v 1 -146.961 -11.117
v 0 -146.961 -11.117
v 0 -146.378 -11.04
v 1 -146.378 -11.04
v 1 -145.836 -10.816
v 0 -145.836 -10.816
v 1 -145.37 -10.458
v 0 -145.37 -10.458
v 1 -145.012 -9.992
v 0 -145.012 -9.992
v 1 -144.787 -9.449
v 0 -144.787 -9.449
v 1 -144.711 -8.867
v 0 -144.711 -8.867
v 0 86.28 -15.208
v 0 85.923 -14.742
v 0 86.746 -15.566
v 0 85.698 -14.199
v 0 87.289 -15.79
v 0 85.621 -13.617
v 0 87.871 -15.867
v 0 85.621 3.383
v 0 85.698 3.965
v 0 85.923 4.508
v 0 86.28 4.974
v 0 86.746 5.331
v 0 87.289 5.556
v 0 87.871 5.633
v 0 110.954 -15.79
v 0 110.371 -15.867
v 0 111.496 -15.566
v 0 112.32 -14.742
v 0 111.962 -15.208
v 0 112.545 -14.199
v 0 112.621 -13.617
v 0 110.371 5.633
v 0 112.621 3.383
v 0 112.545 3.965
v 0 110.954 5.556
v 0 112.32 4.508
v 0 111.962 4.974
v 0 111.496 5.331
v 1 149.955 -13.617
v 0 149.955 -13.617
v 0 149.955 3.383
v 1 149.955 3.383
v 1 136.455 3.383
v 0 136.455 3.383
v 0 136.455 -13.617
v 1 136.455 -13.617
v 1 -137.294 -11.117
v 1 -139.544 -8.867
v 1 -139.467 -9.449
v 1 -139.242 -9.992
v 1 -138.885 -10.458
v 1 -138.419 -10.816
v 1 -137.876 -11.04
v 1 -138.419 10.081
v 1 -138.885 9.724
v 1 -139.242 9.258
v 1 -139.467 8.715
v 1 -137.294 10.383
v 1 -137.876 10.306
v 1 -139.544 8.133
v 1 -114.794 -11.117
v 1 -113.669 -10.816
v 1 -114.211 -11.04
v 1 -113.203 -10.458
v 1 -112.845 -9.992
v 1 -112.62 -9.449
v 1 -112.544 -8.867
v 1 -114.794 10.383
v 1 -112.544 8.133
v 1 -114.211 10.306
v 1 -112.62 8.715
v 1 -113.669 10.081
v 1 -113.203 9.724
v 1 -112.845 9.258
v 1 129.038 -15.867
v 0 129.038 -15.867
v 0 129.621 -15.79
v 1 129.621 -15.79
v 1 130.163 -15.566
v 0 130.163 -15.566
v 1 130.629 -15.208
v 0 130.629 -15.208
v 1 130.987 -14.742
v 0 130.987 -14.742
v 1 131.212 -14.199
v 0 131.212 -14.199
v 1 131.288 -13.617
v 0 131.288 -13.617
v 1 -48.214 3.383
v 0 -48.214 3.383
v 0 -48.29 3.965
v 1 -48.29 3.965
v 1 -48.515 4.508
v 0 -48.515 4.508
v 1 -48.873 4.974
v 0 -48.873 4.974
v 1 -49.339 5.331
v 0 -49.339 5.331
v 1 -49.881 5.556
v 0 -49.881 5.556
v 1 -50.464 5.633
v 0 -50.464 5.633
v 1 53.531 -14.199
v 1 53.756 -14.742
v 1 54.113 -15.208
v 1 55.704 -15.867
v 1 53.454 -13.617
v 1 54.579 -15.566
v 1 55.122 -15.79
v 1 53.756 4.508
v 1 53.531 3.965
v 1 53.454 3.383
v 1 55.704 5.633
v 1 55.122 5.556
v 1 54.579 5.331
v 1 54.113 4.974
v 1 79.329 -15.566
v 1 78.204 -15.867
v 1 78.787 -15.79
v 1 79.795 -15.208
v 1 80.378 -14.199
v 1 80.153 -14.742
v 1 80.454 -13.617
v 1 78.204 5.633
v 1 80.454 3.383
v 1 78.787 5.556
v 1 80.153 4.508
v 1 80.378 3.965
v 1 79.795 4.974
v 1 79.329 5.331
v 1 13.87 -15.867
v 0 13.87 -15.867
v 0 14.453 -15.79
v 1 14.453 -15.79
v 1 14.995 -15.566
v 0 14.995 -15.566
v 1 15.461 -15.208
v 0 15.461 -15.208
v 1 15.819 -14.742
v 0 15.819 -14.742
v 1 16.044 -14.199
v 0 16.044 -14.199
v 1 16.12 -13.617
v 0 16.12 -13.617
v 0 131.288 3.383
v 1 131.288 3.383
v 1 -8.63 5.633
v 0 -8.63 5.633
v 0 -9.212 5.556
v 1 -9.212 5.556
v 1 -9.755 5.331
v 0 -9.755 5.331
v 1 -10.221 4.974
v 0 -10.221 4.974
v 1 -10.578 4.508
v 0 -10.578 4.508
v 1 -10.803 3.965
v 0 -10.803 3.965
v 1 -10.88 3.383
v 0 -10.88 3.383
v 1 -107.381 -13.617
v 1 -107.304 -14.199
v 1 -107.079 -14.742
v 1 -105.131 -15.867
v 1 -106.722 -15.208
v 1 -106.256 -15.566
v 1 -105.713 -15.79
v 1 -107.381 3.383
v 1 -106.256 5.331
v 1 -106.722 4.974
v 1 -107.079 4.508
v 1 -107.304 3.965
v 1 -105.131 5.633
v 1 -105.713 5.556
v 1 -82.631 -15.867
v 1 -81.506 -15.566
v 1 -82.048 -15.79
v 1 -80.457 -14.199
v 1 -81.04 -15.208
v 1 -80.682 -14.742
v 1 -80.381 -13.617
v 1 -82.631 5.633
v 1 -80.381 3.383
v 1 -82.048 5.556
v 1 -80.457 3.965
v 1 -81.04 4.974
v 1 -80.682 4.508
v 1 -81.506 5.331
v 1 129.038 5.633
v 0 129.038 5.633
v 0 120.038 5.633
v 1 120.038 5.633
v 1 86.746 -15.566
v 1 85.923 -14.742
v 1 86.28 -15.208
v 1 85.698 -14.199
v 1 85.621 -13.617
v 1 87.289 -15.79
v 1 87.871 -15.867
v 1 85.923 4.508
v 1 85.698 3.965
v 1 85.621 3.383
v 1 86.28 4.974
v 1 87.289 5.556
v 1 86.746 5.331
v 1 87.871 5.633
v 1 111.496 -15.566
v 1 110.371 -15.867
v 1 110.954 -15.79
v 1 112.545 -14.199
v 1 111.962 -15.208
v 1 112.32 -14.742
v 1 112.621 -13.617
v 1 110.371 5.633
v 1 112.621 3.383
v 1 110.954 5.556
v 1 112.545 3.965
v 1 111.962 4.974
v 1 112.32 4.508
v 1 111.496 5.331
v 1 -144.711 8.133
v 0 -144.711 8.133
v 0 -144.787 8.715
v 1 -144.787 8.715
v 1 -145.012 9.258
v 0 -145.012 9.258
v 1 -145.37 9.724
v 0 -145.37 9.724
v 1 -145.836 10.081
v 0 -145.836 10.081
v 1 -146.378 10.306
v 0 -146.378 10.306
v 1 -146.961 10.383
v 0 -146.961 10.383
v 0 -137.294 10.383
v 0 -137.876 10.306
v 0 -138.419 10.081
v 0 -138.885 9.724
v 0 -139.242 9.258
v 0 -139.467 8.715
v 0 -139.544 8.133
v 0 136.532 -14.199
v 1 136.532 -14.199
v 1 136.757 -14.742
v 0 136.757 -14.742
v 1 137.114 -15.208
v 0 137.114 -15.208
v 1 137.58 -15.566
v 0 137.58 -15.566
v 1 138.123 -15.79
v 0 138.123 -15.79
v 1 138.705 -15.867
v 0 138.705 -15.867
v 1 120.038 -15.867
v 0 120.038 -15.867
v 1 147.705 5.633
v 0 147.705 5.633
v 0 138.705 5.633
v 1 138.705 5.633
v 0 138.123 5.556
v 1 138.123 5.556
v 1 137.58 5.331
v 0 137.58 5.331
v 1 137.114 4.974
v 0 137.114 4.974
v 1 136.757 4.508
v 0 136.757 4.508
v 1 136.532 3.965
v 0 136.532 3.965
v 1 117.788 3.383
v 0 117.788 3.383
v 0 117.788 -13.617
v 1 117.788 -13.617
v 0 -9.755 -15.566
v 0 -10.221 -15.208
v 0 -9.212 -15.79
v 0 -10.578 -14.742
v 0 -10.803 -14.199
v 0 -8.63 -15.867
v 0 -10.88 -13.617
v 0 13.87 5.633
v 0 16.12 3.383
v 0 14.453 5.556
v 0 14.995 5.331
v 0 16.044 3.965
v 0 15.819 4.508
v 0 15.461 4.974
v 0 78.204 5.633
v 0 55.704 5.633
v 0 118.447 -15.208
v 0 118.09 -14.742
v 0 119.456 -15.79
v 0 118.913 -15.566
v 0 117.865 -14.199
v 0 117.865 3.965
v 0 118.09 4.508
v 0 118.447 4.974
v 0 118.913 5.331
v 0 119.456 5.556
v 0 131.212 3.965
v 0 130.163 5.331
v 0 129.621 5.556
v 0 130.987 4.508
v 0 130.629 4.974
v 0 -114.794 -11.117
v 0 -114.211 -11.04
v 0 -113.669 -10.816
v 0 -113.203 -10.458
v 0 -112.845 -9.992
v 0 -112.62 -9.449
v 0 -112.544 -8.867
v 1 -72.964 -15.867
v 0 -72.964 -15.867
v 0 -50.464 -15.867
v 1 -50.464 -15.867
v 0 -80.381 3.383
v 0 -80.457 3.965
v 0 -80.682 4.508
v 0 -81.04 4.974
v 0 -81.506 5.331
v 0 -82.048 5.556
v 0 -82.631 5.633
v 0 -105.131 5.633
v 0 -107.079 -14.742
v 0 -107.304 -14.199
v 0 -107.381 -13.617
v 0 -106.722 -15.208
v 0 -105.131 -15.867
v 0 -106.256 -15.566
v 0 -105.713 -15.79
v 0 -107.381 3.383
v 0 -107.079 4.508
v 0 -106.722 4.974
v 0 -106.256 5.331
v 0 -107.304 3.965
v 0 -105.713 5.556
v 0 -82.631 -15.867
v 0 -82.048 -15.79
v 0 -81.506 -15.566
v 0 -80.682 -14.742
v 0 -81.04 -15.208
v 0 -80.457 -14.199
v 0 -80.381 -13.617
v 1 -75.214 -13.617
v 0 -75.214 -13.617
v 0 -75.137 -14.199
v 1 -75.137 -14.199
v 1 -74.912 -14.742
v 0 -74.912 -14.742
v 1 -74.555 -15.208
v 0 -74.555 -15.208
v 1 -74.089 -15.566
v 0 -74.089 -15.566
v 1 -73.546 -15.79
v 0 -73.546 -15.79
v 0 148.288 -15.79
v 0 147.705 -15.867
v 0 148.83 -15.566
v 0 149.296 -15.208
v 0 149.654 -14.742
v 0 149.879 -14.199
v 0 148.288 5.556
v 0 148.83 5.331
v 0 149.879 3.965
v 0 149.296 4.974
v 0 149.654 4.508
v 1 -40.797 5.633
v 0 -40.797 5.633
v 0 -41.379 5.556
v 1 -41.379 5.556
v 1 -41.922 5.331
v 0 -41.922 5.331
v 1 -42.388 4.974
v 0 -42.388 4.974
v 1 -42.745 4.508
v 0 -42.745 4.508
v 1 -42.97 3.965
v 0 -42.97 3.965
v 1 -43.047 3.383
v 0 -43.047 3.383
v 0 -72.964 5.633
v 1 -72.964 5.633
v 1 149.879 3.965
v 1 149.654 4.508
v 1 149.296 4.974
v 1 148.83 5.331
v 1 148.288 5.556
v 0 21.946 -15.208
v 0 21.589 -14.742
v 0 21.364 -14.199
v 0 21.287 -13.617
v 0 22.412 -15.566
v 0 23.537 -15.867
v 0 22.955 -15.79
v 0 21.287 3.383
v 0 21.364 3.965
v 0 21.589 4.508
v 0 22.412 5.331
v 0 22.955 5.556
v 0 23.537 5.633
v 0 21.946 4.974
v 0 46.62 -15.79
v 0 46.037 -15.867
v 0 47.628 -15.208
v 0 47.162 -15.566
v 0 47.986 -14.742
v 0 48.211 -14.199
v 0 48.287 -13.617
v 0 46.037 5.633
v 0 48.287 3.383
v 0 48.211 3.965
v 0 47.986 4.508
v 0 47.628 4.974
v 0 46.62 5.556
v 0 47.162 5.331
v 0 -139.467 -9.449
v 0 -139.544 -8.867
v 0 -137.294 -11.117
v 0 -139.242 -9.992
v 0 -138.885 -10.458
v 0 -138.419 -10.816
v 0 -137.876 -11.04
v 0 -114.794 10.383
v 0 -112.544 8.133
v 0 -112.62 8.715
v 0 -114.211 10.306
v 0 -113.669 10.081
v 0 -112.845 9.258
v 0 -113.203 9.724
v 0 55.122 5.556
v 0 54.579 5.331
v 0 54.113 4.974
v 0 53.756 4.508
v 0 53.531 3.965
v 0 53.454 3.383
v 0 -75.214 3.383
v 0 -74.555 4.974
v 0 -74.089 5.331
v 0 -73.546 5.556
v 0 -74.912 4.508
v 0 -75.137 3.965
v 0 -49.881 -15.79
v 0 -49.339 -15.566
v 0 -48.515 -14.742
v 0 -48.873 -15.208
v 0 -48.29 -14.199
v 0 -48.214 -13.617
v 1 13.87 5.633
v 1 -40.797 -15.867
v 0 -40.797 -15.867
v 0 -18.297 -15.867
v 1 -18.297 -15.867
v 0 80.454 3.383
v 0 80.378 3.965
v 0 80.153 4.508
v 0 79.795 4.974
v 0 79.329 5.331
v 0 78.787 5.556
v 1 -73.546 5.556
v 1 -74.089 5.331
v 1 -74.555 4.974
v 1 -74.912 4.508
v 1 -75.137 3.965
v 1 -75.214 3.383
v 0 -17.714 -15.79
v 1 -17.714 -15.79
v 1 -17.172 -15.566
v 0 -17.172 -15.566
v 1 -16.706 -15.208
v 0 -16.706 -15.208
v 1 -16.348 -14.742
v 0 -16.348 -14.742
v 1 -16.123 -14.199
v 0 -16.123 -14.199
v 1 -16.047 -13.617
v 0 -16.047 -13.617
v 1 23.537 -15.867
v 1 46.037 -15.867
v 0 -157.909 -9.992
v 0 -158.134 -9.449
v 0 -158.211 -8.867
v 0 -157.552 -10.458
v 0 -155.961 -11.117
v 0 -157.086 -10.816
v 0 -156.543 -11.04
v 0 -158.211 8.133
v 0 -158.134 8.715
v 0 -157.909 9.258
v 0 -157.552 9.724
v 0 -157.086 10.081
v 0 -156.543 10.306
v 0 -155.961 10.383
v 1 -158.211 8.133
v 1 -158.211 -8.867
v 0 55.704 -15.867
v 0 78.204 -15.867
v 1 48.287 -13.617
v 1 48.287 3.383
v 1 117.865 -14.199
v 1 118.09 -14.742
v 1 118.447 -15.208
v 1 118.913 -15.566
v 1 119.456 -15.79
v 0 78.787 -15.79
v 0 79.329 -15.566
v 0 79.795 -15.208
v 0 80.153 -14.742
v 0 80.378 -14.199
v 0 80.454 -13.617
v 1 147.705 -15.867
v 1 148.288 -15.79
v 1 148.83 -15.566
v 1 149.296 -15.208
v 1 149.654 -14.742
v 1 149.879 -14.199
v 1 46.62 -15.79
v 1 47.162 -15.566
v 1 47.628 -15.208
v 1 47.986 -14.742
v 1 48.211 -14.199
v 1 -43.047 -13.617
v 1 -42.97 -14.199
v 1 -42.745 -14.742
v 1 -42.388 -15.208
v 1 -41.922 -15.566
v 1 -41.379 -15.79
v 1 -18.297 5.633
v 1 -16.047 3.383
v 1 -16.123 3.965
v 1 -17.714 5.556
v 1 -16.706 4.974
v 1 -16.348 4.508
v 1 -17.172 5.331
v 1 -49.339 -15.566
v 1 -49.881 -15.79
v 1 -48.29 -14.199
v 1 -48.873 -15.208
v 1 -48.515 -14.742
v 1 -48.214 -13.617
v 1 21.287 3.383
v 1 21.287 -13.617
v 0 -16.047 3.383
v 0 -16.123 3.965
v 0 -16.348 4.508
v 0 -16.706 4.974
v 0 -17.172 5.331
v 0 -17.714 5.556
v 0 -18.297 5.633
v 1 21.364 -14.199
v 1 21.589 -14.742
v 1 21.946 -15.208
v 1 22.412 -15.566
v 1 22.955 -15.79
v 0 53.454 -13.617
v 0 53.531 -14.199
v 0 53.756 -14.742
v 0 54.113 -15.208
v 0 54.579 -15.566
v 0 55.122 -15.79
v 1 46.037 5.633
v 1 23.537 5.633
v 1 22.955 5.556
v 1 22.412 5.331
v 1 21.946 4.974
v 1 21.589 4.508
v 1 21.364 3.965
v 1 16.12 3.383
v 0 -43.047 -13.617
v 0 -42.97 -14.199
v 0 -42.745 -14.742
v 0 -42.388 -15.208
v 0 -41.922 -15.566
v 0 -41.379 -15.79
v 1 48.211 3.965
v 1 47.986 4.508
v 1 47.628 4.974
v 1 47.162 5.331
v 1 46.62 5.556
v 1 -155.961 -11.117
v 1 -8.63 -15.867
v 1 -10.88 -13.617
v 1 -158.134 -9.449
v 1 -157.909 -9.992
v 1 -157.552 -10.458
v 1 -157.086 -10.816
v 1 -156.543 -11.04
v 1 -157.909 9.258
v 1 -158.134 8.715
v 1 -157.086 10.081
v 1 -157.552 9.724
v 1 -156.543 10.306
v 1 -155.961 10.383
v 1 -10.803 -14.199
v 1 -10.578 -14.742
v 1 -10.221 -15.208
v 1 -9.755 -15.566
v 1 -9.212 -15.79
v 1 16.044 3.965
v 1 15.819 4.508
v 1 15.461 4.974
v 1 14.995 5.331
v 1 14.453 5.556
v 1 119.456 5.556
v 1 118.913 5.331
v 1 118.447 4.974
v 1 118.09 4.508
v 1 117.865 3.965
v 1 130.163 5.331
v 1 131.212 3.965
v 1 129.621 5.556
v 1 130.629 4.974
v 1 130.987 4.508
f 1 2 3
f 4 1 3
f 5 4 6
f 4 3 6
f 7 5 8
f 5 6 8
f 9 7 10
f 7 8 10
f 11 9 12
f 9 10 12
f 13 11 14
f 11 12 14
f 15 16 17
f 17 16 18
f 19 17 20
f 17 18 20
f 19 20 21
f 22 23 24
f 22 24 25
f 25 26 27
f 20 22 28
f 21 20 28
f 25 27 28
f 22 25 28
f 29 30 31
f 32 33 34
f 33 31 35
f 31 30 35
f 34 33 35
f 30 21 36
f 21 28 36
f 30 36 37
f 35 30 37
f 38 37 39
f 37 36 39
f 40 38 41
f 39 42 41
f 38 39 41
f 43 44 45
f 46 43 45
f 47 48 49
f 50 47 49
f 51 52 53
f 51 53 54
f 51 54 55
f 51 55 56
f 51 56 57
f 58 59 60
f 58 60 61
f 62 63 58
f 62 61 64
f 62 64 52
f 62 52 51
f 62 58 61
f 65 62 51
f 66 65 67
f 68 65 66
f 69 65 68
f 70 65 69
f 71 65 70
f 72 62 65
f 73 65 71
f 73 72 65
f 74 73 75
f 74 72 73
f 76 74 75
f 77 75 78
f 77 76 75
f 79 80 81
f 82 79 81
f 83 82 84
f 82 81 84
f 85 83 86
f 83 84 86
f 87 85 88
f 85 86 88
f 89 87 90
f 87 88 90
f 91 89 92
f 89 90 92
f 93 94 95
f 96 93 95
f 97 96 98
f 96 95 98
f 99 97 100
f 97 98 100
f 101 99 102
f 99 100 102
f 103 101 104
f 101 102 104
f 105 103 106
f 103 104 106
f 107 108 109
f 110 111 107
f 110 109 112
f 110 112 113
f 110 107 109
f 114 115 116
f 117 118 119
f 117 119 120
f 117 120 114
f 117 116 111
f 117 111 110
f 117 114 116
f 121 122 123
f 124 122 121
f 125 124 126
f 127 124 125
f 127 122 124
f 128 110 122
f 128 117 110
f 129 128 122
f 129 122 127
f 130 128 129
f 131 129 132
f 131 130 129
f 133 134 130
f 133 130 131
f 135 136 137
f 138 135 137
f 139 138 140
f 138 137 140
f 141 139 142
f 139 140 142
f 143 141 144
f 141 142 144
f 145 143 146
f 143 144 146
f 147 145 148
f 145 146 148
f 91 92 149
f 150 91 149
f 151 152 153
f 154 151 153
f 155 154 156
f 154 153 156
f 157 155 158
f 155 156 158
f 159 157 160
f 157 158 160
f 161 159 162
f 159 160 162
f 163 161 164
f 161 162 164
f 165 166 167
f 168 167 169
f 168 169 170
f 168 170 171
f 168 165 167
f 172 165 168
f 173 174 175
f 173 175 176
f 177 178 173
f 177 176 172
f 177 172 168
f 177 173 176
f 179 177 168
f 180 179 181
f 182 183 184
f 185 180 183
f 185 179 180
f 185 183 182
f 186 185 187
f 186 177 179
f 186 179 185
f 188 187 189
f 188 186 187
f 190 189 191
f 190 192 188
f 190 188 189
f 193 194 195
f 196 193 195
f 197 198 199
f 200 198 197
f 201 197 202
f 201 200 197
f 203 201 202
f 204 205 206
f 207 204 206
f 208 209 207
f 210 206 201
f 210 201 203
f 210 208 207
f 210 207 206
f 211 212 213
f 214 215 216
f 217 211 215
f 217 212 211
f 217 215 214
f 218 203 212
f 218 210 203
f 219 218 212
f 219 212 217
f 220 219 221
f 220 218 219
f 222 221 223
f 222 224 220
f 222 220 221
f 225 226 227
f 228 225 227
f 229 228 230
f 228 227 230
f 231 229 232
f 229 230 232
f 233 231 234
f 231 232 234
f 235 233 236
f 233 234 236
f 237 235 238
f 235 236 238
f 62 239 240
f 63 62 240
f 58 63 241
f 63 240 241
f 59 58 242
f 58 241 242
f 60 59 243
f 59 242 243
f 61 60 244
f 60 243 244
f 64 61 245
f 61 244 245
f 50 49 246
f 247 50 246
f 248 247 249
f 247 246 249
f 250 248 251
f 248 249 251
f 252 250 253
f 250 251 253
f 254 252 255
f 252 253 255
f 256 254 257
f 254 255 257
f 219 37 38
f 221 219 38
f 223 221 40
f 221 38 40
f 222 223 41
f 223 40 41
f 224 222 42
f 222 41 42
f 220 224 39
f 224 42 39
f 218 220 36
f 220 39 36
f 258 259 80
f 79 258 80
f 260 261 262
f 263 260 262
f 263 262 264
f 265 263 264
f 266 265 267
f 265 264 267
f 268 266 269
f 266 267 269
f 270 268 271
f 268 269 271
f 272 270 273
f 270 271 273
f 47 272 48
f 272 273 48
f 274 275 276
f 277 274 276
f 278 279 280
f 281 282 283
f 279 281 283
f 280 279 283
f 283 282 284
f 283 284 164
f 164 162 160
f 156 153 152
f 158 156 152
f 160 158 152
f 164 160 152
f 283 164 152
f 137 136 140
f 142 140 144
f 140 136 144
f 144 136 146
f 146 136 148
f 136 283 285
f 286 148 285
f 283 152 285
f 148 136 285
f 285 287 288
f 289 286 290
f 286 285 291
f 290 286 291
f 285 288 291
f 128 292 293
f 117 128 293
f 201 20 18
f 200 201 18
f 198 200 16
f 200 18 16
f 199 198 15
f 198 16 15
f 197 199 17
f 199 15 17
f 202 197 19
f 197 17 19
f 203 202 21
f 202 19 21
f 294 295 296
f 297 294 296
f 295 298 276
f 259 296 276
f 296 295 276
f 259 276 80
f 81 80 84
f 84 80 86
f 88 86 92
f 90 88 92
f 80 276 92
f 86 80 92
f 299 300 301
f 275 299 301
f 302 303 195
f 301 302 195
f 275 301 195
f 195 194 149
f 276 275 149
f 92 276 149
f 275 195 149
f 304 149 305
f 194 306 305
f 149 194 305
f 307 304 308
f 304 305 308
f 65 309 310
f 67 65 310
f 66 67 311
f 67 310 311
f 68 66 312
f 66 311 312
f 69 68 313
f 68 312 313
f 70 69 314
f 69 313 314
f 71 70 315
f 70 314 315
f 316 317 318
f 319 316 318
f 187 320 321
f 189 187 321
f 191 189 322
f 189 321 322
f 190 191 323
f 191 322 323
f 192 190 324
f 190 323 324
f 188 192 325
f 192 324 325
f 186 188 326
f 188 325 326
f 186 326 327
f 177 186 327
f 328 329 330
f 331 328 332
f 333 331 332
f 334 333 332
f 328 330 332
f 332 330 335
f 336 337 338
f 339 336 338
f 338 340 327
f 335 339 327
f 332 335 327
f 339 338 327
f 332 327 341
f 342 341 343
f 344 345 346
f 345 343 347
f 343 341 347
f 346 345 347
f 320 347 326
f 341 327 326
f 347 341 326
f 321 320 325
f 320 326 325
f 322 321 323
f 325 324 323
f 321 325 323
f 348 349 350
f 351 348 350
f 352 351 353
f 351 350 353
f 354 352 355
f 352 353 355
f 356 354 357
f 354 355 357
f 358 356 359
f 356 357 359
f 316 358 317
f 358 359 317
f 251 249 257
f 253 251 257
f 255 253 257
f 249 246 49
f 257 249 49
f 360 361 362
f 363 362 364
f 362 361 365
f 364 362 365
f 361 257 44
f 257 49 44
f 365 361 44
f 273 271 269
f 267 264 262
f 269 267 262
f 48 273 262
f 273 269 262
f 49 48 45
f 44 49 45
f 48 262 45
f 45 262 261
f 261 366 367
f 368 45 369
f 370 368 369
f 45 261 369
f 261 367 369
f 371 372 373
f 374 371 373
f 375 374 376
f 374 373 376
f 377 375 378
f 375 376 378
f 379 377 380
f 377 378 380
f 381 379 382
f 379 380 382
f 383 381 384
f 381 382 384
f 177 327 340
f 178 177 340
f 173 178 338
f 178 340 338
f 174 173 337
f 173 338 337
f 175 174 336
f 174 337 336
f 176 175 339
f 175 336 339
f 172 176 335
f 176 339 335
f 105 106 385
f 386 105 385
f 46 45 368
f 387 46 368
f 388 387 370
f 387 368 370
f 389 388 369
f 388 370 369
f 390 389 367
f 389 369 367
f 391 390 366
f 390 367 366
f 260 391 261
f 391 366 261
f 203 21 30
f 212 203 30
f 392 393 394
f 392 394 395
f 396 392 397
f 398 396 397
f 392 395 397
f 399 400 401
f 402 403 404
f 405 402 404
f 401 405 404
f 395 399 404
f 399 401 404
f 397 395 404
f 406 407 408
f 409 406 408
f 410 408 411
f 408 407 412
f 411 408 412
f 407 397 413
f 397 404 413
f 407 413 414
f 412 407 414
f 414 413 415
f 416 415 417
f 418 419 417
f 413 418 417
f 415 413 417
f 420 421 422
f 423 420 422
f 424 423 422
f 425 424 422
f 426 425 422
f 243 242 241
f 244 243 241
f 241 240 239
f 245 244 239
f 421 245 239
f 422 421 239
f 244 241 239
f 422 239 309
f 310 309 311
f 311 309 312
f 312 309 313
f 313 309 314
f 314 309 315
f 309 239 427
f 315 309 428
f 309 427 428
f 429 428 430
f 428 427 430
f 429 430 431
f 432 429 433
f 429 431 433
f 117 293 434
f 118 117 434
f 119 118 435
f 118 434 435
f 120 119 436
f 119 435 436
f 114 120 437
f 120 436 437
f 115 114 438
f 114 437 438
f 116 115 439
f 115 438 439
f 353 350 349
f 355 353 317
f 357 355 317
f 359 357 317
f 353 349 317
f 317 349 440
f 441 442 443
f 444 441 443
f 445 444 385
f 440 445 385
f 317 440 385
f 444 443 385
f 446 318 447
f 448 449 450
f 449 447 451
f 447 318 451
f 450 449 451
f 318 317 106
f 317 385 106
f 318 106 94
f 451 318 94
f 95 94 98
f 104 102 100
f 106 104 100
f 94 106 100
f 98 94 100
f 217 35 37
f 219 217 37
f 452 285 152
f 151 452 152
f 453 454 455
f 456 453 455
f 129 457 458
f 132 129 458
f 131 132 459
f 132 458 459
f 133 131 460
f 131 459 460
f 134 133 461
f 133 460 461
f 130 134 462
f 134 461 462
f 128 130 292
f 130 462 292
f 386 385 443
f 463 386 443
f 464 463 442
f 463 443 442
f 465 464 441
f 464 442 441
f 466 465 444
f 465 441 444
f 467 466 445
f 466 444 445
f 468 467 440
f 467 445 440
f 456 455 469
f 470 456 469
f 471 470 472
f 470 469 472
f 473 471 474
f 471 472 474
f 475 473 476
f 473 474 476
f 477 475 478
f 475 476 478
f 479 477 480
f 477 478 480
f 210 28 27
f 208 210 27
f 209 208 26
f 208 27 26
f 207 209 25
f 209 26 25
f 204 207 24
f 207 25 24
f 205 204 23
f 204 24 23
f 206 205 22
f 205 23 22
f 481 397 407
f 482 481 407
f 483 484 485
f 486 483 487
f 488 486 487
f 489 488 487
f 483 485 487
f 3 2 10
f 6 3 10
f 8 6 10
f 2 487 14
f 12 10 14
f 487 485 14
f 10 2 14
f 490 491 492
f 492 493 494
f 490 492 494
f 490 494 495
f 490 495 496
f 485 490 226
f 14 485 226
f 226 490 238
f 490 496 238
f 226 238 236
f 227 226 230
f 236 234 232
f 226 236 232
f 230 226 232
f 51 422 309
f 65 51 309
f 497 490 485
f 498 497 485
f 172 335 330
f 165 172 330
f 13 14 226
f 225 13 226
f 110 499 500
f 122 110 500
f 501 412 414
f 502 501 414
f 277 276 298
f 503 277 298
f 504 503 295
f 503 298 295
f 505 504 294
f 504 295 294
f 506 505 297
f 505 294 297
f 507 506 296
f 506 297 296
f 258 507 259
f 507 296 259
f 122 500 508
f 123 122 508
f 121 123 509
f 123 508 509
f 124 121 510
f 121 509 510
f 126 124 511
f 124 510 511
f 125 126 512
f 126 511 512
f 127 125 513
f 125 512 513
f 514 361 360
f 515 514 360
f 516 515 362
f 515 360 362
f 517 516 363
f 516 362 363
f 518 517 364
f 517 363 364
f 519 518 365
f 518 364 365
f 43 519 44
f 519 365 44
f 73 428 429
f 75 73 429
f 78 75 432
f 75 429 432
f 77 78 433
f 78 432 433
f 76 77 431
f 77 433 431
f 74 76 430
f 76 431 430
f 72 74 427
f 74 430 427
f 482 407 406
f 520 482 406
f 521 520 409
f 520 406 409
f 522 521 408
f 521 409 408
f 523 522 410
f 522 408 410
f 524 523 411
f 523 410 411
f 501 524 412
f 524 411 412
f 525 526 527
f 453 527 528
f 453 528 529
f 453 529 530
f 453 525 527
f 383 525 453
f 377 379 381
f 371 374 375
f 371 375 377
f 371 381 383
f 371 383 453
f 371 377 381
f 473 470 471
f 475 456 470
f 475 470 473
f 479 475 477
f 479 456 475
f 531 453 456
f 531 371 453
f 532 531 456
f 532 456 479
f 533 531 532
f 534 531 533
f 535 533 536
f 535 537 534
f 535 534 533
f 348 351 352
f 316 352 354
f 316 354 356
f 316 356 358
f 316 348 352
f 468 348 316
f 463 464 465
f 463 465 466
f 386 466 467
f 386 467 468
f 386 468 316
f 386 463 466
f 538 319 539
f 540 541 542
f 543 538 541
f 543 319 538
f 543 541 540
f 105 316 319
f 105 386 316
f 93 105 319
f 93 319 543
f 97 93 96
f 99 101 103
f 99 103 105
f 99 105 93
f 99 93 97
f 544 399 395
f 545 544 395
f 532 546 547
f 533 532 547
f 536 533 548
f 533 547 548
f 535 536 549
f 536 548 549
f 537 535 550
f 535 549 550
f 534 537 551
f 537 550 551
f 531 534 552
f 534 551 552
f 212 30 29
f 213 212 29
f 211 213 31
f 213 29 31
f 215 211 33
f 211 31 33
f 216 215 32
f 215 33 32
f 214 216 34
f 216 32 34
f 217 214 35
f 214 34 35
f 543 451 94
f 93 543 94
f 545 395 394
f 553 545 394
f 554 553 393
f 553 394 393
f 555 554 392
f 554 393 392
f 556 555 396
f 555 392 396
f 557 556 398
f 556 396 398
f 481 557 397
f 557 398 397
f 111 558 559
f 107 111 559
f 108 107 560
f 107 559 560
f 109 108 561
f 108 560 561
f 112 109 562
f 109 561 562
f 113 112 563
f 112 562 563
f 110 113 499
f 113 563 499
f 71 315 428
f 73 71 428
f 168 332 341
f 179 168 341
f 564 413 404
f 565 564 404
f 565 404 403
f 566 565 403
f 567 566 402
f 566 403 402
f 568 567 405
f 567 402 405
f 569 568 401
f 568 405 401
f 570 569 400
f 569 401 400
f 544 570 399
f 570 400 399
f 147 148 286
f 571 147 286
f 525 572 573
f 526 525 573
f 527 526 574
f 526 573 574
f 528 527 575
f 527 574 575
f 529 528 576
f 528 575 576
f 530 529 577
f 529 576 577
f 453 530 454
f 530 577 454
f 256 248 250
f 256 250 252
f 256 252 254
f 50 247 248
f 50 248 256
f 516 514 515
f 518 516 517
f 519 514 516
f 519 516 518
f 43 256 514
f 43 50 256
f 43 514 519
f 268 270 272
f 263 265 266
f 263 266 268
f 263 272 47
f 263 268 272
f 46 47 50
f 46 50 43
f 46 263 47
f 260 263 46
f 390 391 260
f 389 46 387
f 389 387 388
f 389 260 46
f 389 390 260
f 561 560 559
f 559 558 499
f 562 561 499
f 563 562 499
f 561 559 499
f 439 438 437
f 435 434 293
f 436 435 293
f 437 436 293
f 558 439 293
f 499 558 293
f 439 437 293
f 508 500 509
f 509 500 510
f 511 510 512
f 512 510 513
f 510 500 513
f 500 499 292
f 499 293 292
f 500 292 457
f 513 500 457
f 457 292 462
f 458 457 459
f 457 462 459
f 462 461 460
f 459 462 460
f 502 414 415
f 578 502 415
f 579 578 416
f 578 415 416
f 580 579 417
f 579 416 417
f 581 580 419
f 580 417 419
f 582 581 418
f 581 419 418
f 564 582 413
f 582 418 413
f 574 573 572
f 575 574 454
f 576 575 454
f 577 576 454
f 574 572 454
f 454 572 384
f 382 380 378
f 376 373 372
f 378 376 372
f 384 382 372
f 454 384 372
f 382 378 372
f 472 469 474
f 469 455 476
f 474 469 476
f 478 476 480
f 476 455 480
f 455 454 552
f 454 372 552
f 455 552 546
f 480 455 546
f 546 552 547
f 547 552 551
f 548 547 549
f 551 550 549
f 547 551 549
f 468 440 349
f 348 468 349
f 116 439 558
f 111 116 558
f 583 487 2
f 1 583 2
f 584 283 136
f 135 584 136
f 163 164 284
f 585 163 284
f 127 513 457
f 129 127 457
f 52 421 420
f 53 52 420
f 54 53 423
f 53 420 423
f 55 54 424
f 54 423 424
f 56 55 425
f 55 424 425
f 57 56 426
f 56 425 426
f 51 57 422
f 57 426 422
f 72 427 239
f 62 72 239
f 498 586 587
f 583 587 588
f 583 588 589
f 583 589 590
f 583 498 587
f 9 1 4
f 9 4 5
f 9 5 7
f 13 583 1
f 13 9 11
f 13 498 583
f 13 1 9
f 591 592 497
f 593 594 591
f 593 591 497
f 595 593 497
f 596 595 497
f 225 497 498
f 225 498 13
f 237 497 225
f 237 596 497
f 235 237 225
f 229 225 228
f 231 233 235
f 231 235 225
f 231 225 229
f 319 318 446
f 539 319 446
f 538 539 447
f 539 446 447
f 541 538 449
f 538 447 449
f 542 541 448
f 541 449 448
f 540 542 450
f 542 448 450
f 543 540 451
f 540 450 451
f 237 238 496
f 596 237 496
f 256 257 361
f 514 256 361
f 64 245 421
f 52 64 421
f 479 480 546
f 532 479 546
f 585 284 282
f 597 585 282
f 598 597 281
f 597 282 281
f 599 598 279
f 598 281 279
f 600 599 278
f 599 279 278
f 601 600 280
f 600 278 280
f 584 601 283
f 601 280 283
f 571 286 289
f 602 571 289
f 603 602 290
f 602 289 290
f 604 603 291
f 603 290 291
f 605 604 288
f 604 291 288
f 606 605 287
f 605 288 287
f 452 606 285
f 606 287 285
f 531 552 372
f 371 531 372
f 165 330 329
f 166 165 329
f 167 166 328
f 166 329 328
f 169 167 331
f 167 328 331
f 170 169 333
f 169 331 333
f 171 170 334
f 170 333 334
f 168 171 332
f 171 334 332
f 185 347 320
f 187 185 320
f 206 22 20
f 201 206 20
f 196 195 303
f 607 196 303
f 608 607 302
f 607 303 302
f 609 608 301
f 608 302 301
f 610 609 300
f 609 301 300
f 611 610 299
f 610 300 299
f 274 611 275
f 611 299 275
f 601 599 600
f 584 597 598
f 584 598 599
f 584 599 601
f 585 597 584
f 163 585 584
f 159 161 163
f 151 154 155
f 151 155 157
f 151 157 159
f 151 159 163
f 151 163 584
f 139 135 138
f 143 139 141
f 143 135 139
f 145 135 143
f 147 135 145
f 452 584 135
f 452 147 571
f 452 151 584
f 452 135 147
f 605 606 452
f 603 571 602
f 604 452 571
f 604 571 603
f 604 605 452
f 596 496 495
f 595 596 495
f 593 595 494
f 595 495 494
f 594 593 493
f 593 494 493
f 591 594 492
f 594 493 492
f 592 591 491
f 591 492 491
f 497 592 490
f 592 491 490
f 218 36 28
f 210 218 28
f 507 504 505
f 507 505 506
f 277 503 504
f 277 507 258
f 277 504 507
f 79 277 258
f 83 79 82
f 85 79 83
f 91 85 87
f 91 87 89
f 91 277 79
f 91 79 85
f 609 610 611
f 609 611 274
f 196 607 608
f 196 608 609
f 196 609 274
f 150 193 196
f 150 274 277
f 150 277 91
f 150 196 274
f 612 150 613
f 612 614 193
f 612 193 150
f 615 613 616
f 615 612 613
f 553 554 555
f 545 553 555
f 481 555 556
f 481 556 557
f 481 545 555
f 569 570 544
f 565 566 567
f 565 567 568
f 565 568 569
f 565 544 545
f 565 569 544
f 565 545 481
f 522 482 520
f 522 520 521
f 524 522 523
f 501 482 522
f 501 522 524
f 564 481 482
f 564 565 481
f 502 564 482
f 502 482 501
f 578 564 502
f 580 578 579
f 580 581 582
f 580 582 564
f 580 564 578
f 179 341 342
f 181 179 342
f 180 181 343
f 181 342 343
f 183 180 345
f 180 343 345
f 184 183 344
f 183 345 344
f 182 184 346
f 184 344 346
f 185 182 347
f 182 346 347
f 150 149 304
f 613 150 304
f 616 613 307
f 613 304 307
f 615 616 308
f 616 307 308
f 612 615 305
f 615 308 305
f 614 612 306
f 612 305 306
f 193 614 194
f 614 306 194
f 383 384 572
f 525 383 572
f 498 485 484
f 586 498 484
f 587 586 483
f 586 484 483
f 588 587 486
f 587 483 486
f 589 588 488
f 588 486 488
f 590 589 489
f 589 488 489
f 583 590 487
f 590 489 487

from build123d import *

# Parameters (mm, degrees)
F1_DEPTH = 1


with BuildPart() as f1:
    # F0 (on Right) → F1 (new body)
    with BuildSketch(Plane.YZ):
        with BuildLine():
            Line((80.454406, -13.617133), (80.454406, 3.382867))
            ThreePointArc((80.454406, 3.382867), (79.795396, 4.973857), (78.204406, 5.632867))
            Line((78.204406, 5.632867), (55.704406, 5.632867))
            ThreePointArc((55.704406, 5.632867), (54.113415, 4.973857), (53.454406, 3.382867))
            Line((53.454406, 3.382867), (53.454406, -13.617133))
            ThreePointArc((53.454406, -13.617133), (54.113415, -15.208123), (55.704406, -15.867133))
            Line((55.704406, -15.867133), (78.204406, -15.867133))
            ThreePointArc((78.204406, -15.867133), (79.795396, -15.208123), (80.454406, -13.617133))
        make_face()
        with BuildLine():
            Line((-16.046594, -13.617133), (-16.046594, 3.382867))
            ThreePointArc((-16.046594, 3.382867), (-16.705604, 4.973857), (-18.296594, 5.632867))
            Line((-18.296594, 5.632867), (-40.796594, 5.632867))
            ThreePointArc((-40.796594, 5.632867), (-42.387585, 4.973857), (-43.046594, 3.382867))
            Line((-43.046594, 3.382867), (-43.046594, -13.617133))
            ThreePointArc((-43.046594, -13.617133), (-42.387585, -15.208123), (-40.796594, -15.867133))
            Line((-40.796594, -15.867133), (-18.296594, -15.867133))
            ThreePointArc((-18.296594, -15.867133), (-16.705604, -15.208123), (-16.046594, -13.617133))
        make_face()
        with BuildLine():
            Line((-146.960594, 10.382867), (-155.960594, 10.382867))
            ThreePointArc((-155.960594, 10.382867), (-157.551585, 9.723857), (-158.210594, 8.132867))
            Line((-158.210594, 8.132867), (-158.210594, -8.867133))
            ThreePointArc((-158.210594, -8.867133), (-157.551585, -10.458123), (-155.960594, -11.117133))
            Line((-155.960594, -11.117133), (-146.960594, -11.117133))
            ThreePointArc((-146.960594, -11.117133), (-145.369604, -10.458123), (-144.710594, -8.867133))
            Line((-144.710594, -8.867133), (-144.710594, 8.132867))
            ThreePointArc((-144.710594, 8.132867), (-145.369604, 9.723857), (-146.960594, 10.382867))
        make_face()
        with BuildLine():
            Line((-107.380594, 3.382867), (-107.380594, -13.617133))
            ThreePointArc((-107.380594, -13.617133), (-106.721585, -15.208123), (-105.130594, -15.867133))
            Line((-105.130594, -15.867133), (-82.630594, -15.867133))
            ThreePointArc((-82.630594, -15.867133), (-81.039604, -15.208123), (-80.380594, -13.617133))
            Line((-80.380594, -13.617133), (-80.380594, 3.382867))
            ThreePointArc((-80.380594, 3.382867), (-81.039604, 4.973857), (-82.630594, 5.632867))
            Line((-82.630594, 5.632867), (-105.130594, 5.632867))
            ThreePointArc((-105.130594, 5.632867), (-106.721585, 4.973857), (-107.380594, 3.382867))
        make_face()
        with BuildLine():
            Line((48.287406, -13.617133), (48.287406, 3.382867))
            ThreePointArc((48.287406, 3.382867), (47.628396, 4.973857), (46.037406, 5.632867))
            Line((46.037406, 5.632867), (23.537406, 5.632867))
            ThreePointArc((23.537406, 5.632867), (21.946415, 4.973857), (21.287406, 3.382867))
            Line((21.287406, 3.382867), (21.287406, -13.617133))
            ThreePointArc((21.287406, -13.617133), (21.946415, -15.208123), (23.537406, -15.867133))
            Line((23.537406, -15.867133), (46.037406, -15.867133))
            ThreePointArc((46.037406, -15.867133), (47.628396, -15.208123), (48.287406, -13.617133))
        make_face()
        with BuildLine():
            Line((-50.463594, 5.632867), (-72.963594, 5.632867))
            ThreePointArc((-72.963594, 5.632867), (-74.554585, 4.973857), (-75.213594, 3.382867))
            Line((-75.213594, 3.382867), (-75.213594, -13.617133))
            ThreePointArc((-75.213594, -13.617133), (-74.554585, -15.208123), (-72.963594, -15.867133))
            Line((-72.963594, -15.867133), (-50.463594, -15.867133))
            ThreePointArc((-50.463594, -15.867133), (-48.872604, -15.208123), (-48.213594, -13.617133))
            Line((-48.213594, -13.617133), (-48.213594, 3.382867))
            ThreePointArc((-48.213594, 3.382867), (-48.872604, 4.973857), (-50.463594, 5.632867))
        make_face()
        with BuildLine():
            Line((13.870406, 5.632867), (-8.629594, 5.632867))
            ThreePointArc((-8.629594, 5.632867), (-10.220585, 4.973857), (-10.879594, 3.382867))
            Line((-10.879594, 3.382867), (-10.879594, -13.617133))
            ThreePointArc((-10.879594, -13.617133), (-10.220585, -15.208123), (-8.629594, -15.867133))
            Line((-8.629594, -15.867133), (13.870406, -15.867133))
            ThreePointArc((13.870406, -15.867133), (15.461396, -15.208123), (16.120406, -13.617133))
            Line((16.120406, -13.617133), (16.120406, 3.382867))
            ThreePointArc((16.120406, 3.382867), (15.461396, 4.973857), (13.870406, 5.632867))
        make_face()
        with BuildLine():
            Line((-112.543594, -8.867133), (-112.543594, 8.132867))
            ThreePointArc((-112.543594, 8.132867), (-113.202604, 9.723857), (-114.793594, 10.382867))
            Line((-114.793594, 10.382867), (-137.293594, 10.382867))
            ThreePointArc((-137.293594, 10.382867), (-138.884585, 9.723857), (-139.543594, 8.132867))
            Line((-139.543594, 8.132867), (-139.543594, -8.867133))
            ThreePointArc((-139.543594, -8.867133), (-138.884585, -10.458123), (-137.293594, -11.117133))
            Line((-137.293594, -11.117133), (-114.793594, -11.117133))
            ThreePointArc((-114.793594, -11.117133), (-113.202604, -10.458123), (-112.543594, -8.867133))
        make_face()
        with BuildLine():
            Line((147.705406, 5.632867), (138.705406, 5.632867))
            ThreePointArc((138.705406, 5.632867), (137.114415, 4.973857), (136.455406, 3.382867))
            Line((136.455406, 3.382867), (136.455406, -13.617133))
            ThreePointArc((136.455406, -13.617133), (137.114415, -15.208123), (138.705406, -15.867133))
            Line((138.705406, -15.867133), (147.705406, -15.867133))
            ThreePointArc((147.705406, -15.867133), (149.296396, -15.208123), (149.955406, -13.617133))
            Line((149.955406, -13.617133), (149.955406, 3.382867))
            ThreePointArc((149.955406, 3.382867), (149.296396, 4.973857), (147.705406, 5.632867))
        make_face()
        with BuildLine():
            Line((112.621406, -13.617133), (112.621406, 3.382867))
            ThreePointArc((112.621406, 3.382867), (111.962396, 4.973857), (110.371406, 5.632867))
            Line((110.371406, 5.632867), (87.871406, 5.632867))
            ThreePointArc((87.871406, 5.632867), (86.280415, 4.973857), (85.621406, 3.382867))
            Line((85.621406, 3.382867), (85.621406, -13.617133))
            ThreePointArc((85.621406, -13.617133), (86.280415, -15.208123), (87.871406, -15.867133))
            Line((87.871406, -15.867133), (110.371406, -15.867133))
            ThreePointArc((110.371406, -15.867133), (111.962396, -15.208123), (112.621406, -13.617133))
        make_face()
        with BuildLine():
            Line((131.288406, -13.617133), (131.288406, 3.382867))
            ThreePointArc((131.288406, 3.382867), (130.629396, 4.973857), (129.038406, 5.632867))
            Line((129.038406, 5.632867), (120.038406, 5.632867))
            ThreePointArc((120.038406, 5.632867), (118.447415, 4.973857), (117.788406, 3.382867))
            Line((117.788406, 3.382867), (117.788406, -13.617133))
            ThreePointArc((117.788406, -13.617133), (118.447415, -15.208123), (120.038406, -15.867133))
            Line((120.038406, -15.867133), (129.038406, -15.867133))
            ThreePointArc((129.038406, -15.867133), (130.629396, -15.208123), (131.288406, -13.617133))
        make_face()
    extrude(amount=F1_DEPTH)


solid = f1.part
